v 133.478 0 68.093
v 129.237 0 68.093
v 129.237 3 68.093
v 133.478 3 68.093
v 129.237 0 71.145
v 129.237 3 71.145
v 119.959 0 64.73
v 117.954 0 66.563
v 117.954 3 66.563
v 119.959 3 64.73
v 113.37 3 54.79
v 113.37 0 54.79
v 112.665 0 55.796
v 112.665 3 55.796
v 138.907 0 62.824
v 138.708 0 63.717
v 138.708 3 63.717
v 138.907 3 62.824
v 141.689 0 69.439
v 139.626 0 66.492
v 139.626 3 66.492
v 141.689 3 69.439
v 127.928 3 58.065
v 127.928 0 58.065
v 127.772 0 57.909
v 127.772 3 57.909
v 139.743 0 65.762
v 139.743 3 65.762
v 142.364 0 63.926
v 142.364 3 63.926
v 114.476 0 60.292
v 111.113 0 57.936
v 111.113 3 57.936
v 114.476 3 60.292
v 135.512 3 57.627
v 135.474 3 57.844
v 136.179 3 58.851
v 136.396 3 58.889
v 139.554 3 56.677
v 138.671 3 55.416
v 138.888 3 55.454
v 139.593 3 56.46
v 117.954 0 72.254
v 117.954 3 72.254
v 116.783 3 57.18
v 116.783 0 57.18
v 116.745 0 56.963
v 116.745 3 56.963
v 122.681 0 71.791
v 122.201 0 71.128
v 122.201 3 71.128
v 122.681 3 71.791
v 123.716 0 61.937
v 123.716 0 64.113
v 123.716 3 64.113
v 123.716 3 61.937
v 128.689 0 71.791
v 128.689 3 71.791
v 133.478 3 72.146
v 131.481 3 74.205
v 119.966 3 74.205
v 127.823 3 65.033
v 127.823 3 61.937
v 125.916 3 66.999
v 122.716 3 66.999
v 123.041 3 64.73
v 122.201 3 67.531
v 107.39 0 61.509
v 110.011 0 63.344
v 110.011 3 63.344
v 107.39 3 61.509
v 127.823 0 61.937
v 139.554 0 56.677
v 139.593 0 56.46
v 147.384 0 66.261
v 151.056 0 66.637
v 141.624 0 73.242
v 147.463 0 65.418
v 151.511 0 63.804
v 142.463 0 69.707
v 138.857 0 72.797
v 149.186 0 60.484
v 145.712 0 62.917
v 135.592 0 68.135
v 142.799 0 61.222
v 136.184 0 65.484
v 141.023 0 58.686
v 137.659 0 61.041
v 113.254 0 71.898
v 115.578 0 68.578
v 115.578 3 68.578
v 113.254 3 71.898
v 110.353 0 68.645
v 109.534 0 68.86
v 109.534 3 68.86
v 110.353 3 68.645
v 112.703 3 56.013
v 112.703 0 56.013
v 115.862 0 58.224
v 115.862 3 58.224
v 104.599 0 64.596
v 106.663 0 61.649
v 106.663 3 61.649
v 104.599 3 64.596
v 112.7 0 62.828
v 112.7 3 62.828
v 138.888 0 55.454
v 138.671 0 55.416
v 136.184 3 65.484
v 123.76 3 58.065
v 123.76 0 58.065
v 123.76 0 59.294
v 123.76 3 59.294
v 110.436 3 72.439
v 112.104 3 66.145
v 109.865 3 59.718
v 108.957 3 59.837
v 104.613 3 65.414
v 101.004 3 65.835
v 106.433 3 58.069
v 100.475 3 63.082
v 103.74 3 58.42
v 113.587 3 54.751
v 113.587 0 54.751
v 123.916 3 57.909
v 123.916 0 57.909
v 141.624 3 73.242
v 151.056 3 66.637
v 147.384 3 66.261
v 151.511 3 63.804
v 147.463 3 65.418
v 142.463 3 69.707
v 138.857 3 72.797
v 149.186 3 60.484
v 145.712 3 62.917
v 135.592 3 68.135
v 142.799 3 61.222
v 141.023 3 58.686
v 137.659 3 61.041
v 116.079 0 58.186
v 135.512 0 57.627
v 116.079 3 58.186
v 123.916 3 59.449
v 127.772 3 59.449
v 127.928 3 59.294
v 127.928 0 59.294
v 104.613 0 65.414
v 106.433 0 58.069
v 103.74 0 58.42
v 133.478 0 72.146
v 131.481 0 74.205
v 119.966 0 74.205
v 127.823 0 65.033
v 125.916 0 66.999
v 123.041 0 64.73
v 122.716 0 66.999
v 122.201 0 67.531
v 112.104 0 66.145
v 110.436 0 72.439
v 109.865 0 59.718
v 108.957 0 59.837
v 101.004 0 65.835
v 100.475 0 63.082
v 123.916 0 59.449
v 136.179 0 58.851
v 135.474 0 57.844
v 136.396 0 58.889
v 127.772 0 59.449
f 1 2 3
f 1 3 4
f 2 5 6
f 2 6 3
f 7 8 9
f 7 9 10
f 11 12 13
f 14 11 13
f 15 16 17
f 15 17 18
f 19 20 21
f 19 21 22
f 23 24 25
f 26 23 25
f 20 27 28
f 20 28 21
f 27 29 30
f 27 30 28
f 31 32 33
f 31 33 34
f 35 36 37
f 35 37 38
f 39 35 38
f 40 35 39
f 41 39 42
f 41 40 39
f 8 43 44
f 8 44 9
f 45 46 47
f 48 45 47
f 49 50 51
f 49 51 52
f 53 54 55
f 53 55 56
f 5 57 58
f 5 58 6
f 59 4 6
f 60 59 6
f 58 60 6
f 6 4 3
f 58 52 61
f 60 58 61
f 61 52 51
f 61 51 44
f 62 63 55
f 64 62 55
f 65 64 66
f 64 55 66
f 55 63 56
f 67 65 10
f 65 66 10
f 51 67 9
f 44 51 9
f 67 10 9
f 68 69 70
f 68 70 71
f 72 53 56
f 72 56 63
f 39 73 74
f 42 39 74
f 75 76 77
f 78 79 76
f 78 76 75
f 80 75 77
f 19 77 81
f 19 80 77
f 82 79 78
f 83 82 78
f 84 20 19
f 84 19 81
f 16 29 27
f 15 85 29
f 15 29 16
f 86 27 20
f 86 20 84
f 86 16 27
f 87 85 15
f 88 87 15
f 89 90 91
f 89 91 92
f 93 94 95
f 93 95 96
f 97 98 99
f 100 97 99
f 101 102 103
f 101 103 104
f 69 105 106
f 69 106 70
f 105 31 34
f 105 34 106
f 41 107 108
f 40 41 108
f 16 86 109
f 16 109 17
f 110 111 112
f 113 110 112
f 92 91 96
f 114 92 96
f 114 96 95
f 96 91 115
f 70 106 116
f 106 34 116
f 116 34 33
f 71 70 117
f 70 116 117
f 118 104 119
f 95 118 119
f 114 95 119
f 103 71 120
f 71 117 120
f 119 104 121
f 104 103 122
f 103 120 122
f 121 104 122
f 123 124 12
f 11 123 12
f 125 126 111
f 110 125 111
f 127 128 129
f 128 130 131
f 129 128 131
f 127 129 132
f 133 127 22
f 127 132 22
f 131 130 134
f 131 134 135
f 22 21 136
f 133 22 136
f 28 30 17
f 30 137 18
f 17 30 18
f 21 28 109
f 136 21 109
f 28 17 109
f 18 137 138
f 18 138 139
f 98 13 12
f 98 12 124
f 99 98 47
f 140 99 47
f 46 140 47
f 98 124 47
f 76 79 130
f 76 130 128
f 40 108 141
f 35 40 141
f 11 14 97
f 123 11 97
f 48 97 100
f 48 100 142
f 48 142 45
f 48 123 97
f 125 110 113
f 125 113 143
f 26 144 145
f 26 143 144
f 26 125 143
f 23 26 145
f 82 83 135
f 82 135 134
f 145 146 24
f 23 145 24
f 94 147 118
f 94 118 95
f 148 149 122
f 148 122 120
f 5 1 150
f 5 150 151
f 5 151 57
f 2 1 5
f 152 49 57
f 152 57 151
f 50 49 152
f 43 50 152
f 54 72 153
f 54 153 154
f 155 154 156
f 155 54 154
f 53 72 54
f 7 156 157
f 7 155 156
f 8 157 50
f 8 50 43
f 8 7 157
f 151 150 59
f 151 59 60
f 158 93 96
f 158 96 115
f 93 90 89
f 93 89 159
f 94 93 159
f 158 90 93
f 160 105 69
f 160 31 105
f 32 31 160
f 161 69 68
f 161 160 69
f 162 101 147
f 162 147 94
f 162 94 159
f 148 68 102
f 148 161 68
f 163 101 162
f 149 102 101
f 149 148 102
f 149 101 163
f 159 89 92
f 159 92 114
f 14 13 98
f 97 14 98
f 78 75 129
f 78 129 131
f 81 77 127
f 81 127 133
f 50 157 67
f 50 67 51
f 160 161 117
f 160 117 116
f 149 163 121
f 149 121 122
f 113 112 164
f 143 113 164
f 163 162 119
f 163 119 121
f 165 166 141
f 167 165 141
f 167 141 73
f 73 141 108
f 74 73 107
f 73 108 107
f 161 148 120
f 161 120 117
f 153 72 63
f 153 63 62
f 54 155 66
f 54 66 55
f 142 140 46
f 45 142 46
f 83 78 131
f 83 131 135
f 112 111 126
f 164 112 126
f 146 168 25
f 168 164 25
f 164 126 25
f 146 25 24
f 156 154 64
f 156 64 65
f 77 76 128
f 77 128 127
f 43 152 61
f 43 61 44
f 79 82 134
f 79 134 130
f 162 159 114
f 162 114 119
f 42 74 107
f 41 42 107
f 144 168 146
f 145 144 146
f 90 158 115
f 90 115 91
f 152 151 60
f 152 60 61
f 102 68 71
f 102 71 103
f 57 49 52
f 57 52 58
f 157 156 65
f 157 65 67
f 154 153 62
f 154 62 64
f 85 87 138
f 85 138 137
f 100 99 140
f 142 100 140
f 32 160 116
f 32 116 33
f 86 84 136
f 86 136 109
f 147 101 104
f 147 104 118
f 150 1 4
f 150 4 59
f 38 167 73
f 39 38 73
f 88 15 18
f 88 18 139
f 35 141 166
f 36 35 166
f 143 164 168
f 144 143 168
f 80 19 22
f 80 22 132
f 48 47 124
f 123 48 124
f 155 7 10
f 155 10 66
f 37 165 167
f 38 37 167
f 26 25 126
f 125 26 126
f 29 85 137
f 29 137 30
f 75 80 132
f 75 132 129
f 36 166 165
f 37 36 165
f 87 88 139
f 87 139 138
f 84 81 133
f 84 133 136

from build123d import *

# Parameters (mm, degrees)
EXTRUDE_1_DEPTH   = 3
EXTRUDE_1_2_DEPTH = 3
EXTRUDE_1_3_DEPTH = 3
EXTRUDE_1_4_DEPTH = 3
EXTRUDE_1_5_DEPTH = 3
EXTRUDE_1_6_DEPTH = 3


with BuildPart() as part:
    # 草图1 → 凸台-拉伸1 (new body)
    with BuildSketch(Plane(origin=(0, 0, 0), x_dir=(1, 0, 0), z_dir=(0, 1, 0))):
        Polygon((133.478301119, -68.092703376), (133.478301119, -72.145504343), (131.48062664, -74.205189433), (119.966187708, -74.205189433), (117.95433315, -72.25390546), (117.95433315, -66.562560774), (119.959309081, -64.73036938), (123.040683717, -64.73036938), (123.716375585, -64.112907192), (123.716375585, -61.937424195), (127.822595537, -61.937424195), (127.822595537, -65.033377491), (125.915941831, -66.999216397), (122.716168825, -66.999216397), (122.200795542, -67.530587588), (122.200795542, -71.128235111), (122.68139591, -71.791053989), (128.688979458, -71.791053989), (129.236737634, -71.145272993), (129.236737634, -68.092703376), align=None)
    extrude(amount=EXTRUDE_1_DEPTH)


with BuildPart() as body_2:
    # 草图1 → Extrude 1 2 (new body)
    with BuildSketch(Plane(origin=(0, 0, 0), x_dir=(1, 0, 0), z_dir=(0, 1, 0))):
        Polygon((127.771950867, -59.449350686), (127.927636292, -59.293665261), (127.927636292, -58.065036111), (127.771950867, -57.909350686), (123.91612256, -57.909350686), (123.760437135, -58.065036111), (123.760437135, -59.293665261), (123.91612256, -59.449350686), align=None)
    extrude(amount=EXTRUDE_1_2_DEPTH)


with BuildPart() as body_3:
    # 草图1 → Extrude 1 3 (new body)
    with BuildSketch(Plane(origin=(0, 0, 0), x_dir=(1, 0, 0), z_dir=(0, 1, 0))):
        Polygon((142.798648209, -61.22231729), (142.364367802, -63.926249886), (139.743267203, -65.761564284), (139.625880119, -66.492444053), (141.689405964, -69.439464376), (142.463268029, -69.706752768), (147.384392373, -66.260944405), (147.462684841, -65.4177704), (145.711802838, -62.917251758), (149.186288237, -60.48439089), (151.510879373, -63.804251087), (151.055867074, -66.637265347), (141.623790884, -73.241676197), (138.856565602, -72.797230309), (135.592144399, -68.135153675), (136.183622722, -65.484303399), (138.707737054, -63.716899516), (138.907069668, -62.823543169), (137.659263883, -61.041491825), (141.022882351, -58.686260818), align=None)
    extrude(amount=EXTRUDE_1_3_DEPTH)


with BuildPart() as body_4:
    # 草图1 → Extrude 1 4 (new body)
    with BuildSketch(Plane(origin=(0, 0, 0), x_dir=(1, 0, 0), z_dir=(0, 1, 0))):
        Polygon((138.670988617, -55.415704758), (135.512478977, -57.627317017), (135.474246434, -57.844144543), (136.178959164, -58.850578623), (136.395786689, -58.888811166), (139.554296329, -56.677198906), (139.592528872, -56.460371381), (138.887816143, -55.453937301), align=None)
    extrude(amount=EXTRUDE_1_4_DEPTH)


with BuildPart() as body_5:
    # 草图1 → Extrude 1 5 (new body)
    with BuildSketch(Plane(origin=(0, 0, 0), x_dir=(1, 0, 0), z_dir=(0, 1, 0))):
        Polygon((112.700364747, -62.827706461), (110.010966593, -63.344415781), (107.389865994, -61.509101383), (106.66291492, -61.64876921), (104.599389075, -64.595789533), (104.61289656, -65.414400018), (109.534020904, -68.86020838), (110.353122896, -68.64539674), (112.104004899, -66.144878099), (115.578490298, -68.577738967), (113.253899162, -71.897599164), (110.436113196, -72.438975407), (101.004037005, -65.834564557), (100.475232738, -63.082213934), (103.739653942, -58.4201373), (106.432935885, -58.069300924), (108.957050218, -59.836704806), (109.864706353, -59.718470327), (111.112512138, -57.936418982), (114.476130606, -60.291649989), align=None)
    extrude(amount=EXTRUDE_1_5_DEPTH)


with BuildPart() as body_6:
    # 草图1 → Extrude 1 6 (new body)
    with BuildSketch(Plane(origin=(0, 0, 0), x_dir=(1, 0, 0), z_dir=(0, 1, 0))):
        Polygon((116.74505297, -56.962996751), (113.58654333, -54.751384491), (113.369715805, -54.789617034), (112.665003075, -55.796051114), (112.703235618, -56.012878639), (115.861745258, -58.224490899), (116.078572783, -58.186258356), (116.783285513, -57.179824276), align=None)
    extrude(amount=EXTRUDE_1_6_DEPTH)


solid = Compound([part.part, body_2.part, body_3.part, body_4.part, body_5.part, body_6.part])
